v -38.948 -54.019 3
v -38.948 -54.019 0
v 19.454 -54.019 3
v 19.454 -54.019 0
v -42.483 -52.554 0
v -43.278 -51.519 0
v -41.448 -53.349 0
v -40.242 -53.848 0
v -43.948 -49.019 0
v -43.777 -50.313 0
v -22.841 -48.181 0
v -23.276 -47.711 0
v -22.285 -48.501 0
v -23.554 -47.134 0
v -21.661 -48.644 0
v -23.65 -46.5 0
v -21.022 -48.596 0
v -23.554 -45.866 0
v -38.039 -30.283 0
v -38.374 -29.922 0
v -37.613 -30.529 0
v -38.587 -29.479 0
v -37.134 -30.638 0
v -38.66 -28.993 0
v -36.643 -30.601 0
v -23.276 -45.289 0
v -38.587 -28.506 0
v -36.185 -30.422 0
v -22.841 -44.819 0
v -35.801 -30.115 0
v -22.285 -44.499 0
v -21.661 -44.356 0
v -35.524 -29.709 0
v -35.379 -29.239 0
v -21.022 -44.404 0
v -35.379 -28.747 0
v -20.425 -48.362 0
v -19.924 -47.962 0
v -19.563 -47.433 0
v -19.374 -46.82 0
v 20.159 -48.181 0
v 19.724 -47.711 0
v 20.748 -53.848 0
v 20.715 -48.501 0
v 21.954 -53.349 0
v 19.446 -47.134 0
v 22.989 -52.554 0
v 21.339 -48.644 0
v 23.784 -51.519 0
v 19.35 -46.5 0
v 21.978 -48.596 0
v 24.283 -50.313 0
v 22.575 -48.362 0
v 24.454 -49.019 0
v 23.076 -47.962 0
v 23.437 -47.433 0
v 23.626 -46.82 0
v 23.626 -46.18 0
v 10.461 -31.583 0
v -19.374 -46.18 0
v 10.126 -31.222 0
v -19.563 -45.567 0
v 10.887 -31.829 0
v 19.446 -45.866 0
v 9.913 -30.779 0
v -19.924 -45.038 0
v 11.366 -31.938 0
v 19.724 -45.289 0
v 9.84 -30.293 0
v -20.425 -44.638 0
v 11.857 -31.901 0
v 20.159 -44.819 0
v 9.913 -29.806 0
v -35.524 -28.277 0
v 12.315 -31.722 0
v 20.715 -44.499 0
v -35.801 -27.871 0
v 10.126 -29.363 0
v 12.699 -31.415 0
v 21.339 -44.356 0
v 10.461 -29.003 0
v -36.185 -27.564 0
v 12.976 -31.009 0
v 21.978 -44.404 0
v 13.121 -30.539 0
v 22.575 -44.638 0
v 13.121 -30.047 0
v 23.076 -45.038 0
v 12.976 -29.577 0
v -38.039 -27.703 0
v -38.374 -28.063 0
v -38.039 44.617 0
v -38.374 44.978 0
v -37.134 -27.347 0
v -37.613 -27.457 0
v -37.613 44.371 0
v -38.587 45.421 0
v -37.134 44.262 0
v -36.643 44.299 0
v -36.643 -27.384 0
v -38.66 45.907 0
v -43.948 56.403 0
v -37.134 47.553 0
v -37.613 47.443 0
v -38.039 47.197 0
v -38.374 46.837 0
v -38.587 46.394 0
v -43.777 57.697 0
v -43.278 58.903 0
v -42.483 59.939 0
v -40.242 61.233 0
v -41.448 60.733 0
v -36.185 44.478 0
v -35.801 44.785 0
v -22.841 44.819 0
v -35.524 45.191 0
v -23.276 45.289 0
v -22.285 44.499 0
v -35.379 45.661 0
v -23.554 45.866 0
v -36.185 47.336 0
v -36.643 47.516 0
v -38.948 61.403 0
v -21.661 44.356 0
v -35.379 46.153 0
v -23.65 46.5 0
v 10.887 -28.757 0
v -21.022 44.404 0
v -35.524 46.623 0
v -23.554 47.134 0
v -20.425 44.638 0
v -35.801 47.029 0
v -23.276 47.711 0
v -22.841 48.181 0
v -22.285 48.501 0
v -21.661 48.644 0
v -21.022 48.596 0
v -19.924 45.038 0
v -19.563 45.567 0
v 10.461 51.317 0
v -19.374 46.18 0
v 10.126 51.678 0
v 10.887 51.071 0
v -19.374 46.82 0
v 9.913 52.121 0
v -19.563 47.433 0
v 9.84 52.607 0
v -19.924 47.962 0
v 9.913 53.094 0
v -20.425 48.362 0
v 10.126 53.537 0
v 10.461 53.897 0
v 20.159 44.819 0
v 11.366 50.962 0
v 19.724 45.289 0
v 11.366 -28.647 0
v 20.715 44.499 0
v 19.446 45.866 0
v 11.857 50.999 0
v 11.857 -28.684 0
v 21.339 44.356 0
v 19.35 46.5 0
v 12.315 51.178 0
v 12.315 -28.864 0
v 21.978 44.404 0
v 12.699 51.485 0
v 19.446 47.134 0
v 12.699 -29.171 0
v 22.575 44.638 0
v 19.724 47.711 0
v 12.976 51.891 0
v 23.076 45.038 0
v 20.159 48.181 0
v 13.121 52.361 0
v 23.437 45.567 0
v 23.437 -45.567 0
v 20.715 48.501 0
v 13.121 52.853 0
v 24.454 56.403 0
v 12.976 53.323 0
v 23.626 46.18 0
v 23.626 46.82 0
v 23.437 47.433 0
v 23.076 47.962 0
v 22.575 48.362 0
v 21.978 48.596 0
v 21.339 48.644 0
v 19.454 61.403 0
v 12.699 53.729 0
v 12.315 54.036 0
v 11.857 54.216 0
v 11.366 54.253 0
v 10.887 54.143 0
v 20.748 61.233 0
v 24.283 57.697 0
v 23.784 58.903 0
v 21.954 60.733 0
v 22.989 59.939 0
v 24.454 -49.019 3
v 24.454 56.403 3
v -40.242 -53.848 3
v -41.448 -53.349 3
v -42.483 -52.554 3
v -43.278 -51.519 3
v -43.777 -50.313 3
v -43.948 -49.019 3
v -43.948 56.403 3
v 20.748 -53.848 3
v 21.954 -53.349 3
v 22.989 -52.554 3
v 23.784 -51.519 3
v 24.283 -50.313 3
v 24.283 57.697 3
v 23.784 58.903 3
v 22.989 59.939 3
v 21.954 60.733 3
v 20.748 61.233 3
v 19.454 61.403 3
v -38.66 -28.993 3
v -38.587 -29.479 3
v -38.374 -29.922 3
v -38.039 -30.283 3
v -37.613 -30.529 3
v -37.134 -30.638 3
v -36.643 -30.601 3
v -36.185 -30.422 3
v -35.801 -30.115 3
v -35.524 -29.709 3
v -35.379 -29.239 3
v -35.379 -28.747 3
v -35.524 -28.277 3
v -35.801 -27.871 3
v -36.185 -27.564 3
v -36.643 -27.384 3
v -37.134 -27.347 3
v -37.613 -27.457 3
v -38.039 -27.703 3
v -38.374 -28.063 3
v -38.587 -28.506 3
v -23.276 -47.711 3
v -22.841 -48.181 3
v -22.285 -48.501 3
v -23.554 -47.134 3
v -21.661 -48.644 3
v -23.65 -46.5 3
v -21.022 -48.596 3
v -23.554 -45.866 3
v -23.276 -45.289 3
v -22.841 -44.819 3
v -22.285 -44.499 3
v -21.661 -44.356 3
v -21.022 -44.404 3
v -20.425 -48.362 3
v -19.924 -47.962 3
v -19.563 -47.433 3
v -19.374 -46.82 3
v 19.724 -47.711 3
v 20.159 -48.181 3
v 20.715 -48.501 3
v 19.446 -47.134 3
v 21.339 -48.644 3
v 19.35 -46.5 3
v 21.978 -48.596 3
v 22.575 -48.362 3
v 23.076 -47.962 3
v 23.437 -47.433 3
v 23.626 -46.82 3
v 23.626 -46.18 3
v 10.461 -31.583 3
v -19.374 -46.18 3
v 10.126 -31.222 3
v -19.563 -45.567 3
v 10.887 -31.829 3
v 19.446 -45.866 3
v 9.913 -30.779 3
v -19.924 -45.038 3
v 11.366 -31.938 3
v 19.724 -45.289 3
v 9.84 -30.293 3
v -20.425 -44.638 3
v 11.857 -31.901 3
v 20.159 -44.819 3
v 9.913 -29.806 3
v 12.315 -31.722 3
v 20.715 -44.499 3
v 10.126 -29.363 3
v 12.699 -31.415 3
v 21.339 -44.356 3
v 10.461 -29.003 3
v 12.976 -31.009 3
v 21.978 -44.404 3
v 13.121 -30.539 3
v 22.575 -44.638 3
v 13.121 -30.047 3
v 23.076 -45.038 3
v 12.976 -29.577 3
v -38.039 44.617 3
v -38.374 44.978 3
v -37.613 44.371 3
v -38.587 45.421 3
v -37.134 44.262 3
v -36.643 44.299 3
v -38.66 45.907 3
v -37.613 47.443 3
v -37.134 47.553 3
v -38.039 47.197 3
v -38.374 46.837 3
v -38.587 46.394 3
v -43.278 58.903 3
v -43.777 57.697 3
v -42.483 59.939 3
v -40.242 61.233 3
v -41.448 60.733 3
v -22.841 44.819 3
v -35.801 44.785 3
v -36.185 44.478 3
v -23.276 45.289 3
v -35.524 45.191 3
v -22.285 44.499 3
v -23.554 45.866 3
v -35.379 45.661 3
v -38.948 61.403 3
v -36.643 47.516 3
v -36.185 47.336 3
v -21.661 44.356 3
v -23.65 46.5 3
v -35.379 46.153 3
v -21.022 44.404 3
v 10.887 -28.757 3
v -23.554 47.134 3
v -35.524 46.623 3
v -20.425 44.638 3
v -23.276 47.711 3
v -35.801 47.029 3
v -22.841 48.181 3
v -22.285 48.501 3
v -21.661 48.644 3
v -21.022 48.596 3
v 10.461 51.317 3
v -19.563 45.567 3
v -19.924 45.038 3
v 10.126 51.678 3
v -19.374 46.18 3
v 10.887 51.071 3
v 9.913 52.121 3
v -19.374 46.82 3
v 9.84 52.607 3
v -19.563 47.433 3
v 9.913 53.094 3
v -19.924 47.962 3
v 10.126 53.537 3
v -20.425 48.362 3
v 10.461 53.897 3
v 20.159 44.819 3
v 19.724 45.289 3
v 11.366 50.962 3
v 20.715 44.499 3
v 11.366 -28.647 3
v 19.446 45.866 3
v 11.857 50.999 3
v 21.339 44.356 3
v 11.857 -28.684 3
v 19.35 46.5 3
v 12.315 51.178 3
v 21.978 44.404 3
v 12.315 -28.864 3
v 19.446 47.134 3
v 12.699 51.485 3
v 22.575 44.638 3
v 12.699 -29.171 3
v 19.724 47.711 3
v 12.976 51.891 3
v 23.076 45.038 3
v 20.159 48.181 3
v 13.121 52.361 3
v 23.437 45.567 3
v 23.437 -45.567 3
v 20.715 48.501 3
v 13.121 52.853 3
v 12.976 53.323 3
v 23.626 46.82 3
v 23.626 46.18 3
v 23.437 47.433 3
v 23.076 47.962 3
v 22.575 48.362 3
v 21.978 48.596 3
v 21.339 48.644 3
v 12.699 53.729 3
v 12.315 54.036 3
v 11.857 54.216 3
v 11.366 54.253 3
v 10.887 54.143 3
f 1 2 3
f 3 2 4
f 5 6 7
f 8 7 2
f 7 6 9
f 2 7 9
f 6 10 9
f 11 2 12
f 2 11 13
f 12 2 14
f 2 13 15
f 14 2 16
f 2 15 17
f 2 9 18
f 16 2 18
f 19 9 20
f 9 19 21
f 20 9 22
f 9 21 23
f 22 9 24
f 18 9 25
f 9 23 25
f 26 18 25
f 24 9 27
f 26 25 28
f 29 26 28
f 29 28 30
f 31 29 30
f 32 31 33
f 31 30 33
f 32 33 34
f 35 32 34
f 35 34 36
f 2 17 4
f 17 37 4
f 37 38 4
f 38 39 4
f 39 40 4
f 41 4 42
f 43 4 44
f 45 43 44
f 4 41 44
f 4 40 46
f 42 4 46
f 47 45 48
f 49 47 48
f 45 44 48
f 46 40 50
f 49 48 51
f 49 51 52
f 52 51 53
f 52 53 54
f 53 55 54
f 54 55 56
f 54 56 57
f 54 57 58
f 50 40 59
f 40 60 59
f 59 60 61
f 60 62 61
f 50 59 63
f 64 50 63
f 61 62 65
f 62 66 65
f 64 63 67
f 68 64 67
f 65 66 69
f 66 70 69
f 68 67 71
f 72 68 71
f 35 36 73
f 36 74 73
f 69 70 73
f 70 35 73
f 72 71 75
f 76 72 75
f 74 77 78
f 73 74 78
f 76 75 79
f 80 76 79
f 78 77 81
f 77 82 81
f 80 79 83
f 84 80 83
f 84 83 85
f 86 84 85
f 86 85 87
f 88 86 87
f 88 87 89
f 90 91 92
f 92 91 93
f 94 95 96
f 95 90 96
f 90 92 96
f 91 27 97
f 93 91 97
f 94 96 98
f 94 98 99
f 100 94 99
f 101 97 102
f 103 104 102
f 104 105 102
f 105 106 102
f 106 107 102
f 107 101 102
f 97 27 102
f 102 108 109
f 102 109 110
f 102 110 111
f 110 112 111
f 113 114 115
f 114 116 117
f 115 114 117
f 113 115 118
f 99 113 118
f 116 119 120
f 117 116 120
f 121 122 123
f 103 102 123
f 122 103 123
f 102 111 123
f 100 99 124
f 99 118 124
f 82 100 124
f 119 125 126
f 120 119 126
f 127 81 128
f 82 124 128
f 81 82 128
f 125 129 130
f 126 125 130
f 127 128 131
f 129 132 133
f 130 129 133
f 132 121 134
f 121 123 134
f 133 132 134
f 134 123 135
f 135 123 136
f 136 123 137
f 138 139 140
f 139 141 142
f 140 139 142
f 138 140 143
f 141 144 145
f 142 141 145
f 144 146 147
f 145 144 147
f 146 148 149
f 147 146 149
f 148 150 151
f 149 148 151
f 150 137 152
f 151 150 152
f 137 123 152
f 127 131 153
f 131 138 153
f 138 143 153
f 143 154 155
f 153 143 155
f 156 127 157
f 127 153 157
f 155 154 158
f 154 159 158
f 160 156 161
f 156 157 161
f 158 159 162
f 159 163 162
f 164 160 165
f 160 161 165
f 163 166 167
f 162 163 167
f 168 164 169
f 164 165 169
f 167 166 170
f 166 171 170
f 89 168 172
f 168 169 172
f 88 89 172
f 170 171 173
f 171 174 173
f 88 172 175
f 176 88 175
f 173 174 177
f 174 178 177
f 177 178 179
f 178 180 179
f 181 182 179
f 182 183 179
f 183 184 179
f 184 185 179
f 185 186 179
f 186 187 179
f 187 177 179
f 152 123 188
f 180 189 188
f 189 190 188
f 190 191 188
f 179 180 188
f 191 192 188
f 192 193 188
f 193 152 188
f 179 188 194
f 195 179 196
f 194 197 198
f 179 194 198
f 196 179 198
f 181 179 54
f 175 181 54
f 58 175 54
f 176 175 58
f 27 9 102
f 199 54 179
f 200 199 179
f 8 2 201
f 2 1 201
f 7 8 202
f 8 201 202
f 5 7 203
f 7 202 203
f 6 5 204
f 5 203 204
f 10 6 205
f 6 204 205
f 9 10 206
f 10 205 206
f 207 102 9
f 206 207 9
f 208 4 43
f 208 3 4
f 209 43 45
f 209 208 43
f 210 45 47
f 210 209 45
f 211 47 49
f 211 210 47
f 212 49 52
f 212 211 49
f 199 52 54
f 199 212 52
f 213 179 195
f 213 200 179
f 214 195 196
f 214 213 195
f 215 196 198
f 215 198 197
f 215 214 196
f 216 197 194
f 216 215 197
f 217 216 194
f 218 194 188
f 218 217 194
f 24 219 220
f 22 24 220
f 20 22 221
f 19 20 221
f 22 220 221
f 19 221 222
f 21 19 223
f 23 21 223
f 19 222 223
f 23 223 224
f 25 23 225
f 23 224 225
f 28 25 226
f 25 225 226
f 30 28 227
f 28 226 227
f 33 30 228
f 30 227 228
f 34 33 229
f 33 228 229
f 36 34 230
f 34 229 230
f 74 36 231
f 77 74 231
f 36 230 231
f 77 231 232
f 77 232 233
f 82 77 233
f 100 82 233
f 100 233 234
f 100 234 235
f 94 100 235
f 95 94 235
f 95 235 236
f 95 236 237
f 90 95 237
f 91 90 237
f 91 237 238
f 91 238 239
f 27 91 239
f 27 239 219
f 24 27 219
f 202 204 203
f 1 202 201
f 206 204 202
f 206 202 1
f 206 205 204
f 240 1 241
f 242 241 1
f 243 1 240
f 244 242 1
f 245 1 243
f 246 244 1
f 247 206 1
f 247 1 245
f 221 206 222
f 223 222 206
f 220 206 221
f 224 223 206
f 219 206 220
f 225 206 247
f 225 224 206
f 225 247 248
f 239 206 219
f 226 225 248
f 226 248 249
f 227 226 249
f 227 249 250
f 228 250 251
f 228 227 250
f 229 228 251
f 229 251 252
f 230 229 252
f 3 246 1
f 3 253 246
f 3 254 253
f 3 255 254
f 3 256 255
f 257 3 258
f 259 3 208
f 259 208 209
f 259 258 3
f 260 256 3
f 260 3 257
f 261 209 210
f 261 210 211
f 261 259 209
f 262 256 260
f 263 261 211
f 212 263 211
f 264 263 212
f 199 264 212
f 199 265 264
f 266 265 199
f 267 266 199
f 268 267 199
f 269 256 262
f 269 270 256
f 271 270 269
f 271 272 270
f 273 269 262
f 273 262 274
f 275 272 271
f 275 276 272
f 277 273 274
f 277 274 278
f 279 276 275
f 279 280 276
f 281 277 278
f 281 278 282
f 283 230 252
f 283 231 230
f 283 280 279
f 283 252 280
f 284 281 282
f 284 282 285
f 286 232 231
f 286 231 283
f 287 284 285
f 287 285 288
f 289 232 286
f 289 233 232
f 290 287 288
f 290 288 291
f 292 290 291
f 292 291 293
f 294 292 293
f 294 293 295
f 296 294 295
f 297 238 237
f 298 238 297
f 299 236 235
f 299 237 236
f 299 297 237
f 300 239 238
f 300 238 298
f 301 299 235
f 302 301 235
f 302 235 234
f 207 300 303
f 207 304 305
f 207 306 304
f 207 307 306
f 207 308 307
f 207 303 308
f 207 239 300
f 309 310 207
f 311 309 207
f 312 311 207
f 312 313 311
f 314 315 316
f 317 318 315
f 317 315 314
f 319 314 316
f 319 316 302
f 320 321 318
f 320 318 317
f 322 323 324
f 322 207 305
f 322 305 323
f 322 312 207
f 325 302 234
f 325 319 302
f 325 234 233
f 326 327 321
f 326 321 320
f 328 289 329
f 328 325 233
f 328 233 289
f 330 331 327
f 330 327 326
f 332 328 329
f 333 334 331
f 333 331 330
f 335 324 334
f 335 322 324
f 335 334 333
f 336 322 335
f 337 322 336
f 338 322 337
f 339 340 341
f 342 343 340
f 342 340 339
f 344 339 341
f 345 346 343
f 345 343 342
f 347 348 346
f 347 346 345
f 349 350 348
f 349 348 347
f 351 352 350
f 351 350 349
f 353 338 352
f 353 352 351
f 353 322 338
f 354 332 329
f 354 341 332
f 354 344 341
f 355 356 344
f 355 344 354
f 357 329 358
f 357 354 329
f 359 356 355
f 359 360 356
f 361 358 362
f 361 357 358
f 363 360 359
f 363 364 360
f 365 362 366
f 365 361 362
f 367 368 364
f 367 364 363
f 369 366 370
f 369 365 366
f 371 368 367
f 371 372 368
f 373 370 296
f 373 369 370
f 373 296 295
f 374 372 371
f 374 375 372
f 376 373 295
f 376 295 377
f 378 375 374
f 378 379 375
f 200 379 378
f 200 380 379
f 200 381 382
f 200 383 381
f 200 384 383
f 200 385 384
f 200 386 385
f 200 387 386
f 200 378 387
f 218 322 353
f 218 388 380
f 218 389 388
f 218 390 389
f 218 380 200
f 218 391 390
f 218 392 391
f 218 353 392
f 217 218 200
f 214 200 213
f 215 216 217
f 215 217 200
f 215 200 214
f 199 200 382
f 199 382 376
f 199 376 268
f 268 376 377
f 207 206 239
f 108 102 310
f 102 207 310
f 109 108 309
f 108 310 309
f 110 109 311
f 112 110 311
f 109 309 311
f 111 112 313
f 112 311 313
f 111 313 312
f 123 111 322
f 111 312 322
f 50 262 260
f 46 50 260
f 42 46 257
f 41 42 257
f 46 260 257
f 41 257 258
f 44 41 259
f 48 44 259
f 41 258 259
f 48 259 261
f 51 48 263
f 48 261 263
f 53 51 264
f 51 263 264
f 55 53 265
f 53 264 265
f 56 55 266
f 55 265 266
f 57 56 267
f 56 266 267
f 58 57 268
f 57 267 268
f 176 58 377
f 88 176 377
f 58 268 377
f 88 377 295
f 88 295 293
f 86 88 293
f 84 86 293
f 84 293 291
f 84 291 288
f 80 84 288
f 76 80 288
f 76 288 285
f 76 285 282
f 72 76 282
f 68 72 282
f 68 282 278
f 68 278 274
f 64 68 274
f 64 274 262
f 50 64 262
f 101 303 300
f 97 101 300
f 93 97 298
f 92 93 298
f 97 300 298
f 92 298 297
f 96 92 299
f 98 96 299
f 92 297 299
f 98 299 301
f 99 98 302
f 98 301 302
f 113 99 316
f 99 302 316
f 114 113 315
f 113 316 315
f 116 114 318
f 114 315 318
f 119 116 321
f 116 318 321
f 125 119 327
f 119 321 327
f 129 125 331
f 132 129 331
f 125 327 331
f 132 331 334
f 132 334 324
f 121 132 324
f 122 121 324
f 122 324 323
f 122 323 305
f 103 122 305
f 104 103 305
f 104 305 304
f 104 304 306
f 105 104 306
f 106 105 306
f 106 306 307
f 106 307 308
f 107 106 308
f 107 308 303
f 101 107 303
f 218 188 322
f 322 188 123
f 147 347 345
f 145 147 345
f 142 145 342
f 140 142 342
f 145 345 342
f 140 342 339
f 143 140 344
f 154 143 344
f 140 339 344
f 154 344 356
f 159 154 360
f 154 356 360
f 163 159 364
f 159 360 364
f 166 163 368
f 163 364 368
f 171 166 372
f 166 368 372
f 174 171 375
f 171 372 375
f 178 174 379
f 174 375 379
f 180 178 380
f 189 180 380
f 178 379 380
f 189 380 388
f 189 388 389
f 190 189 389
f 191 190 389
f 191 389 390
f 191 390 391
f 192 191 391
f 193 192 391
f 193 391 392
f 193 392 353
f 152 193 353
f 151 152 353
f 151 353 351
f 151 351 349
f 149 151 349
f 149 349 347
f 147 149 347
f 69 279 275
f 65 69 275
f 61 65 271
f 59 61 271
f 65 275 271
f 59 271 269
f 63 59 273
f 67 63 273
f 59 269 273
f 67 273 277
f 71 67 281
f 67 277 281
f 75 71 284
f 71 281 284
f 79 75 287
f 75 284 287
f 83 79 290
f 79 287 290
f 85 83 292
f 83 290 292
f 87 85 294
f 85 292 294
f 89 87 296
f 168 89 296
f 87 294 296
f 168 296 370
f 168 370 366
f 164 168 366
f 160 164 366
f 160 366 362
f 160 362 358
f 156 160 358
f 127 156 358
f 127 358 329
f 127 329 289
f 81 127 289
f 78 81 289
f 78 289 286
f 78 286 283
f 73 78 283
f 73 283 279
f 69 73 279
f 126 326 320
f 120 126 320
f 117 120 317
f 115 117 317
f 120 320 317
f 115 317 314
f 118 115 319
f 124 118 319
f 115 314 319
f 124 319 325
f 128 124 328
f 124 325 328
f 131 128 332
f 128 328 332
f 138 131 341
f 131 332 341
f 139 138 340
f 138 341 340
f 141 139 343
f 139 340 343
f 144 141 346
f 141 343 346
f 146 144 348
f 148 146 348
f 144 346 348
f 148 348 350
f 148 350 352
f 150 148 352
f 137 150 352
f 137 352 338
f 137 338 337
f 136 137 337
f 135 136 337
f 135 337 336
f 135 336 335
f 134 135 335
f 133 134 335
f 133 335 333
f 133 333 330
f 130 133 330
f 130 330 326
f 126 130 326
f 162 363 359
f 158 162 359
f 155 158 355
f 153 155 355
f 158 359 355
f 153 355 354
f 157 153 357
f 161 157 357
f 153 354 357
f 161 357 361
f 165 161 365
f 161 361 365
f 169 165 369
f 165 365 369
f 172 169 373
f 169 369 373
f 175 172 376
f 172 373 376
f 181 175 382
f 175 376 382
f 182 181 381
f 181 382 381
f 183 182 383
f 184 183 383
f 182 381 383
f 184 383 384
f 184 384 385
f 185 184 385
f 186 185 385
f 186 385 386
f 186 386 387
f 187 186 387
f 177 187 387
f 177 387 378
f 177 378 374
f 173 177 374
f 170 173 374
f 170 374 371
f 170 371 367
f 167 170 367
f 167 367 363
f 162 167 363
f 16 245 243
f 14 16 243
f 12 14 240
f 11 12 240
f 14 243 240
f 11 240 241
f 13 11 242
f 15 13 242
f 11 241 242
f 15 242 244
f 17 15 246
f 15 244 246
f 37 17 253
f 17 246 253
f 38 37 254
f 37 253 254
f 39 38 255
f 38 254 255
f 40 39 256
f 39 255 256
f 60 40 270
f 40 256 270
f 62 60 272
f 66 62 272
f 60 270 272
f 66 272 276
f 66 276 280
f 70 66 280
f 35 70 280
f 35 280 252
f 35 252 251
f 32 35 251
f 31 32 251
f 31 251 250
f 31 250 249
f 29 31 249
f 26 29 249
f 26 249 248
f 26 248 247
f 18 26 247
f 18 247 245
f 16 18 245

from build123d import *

# Parameters (mm, degrees)
F1_DEPTH = 3
F2_D     = 3.3
F3_D     = 4.3
F4_R     = 5


# Not quite as in the source:
# - a feature names something its author has since deleted; it is built from what else it names


with BuildPart() as f1:
    # F0 (on Top) → F1 (new body)
    with BuildSketch(Plane.XY):
        Polygon((-43.9476147294, -54.0188625455), (24.4538411498, -54.0188625455), (24.4538411498, 61.4031404257), (-43.9476147294, 61.4031404257), (-43.9476147294, 45.1967306435), align=None)
    extrude(amount=F1_DEPTH)

    # F2 (through all)
    with Locations(Plane(origin=(0, 0, 0), x_dir=(1, 0, 0), z_dir=(0, 0, -1))):
        with Locations((-37.0104938323, -45.9071589798), (11.4895061677, -52.6071589798), (11.4895061677, 30.2928410202), (-37.0104938323, 28.9928410202)):
            Hole(F2_D / 2)

    # F3 (through all)
    with Locations(Plane(origin=(0, 0, 0), x_dir=(1, 0, 0), z_dir=(0, 0, -1))):
        with Locations((-21.5, -46.5), (21.5, -46.5), (21.5, 46.5), (-21.5, 46.5)):
            Hole(F3_D / 2)

    # F4
    f4_edges = [f1.edges().sort_by_distance(p)[0] for p in [
        (-43.947615, -54.018863, 1.5),
        (24.453841, -54.018863, 1.5),
        (-43.947615, 61.40314, 1.5),
        (24.453841, 61.40314, 1.5),
    ]]
    fillet(f4_edges, radius=F4_R)


solid = f1.part
